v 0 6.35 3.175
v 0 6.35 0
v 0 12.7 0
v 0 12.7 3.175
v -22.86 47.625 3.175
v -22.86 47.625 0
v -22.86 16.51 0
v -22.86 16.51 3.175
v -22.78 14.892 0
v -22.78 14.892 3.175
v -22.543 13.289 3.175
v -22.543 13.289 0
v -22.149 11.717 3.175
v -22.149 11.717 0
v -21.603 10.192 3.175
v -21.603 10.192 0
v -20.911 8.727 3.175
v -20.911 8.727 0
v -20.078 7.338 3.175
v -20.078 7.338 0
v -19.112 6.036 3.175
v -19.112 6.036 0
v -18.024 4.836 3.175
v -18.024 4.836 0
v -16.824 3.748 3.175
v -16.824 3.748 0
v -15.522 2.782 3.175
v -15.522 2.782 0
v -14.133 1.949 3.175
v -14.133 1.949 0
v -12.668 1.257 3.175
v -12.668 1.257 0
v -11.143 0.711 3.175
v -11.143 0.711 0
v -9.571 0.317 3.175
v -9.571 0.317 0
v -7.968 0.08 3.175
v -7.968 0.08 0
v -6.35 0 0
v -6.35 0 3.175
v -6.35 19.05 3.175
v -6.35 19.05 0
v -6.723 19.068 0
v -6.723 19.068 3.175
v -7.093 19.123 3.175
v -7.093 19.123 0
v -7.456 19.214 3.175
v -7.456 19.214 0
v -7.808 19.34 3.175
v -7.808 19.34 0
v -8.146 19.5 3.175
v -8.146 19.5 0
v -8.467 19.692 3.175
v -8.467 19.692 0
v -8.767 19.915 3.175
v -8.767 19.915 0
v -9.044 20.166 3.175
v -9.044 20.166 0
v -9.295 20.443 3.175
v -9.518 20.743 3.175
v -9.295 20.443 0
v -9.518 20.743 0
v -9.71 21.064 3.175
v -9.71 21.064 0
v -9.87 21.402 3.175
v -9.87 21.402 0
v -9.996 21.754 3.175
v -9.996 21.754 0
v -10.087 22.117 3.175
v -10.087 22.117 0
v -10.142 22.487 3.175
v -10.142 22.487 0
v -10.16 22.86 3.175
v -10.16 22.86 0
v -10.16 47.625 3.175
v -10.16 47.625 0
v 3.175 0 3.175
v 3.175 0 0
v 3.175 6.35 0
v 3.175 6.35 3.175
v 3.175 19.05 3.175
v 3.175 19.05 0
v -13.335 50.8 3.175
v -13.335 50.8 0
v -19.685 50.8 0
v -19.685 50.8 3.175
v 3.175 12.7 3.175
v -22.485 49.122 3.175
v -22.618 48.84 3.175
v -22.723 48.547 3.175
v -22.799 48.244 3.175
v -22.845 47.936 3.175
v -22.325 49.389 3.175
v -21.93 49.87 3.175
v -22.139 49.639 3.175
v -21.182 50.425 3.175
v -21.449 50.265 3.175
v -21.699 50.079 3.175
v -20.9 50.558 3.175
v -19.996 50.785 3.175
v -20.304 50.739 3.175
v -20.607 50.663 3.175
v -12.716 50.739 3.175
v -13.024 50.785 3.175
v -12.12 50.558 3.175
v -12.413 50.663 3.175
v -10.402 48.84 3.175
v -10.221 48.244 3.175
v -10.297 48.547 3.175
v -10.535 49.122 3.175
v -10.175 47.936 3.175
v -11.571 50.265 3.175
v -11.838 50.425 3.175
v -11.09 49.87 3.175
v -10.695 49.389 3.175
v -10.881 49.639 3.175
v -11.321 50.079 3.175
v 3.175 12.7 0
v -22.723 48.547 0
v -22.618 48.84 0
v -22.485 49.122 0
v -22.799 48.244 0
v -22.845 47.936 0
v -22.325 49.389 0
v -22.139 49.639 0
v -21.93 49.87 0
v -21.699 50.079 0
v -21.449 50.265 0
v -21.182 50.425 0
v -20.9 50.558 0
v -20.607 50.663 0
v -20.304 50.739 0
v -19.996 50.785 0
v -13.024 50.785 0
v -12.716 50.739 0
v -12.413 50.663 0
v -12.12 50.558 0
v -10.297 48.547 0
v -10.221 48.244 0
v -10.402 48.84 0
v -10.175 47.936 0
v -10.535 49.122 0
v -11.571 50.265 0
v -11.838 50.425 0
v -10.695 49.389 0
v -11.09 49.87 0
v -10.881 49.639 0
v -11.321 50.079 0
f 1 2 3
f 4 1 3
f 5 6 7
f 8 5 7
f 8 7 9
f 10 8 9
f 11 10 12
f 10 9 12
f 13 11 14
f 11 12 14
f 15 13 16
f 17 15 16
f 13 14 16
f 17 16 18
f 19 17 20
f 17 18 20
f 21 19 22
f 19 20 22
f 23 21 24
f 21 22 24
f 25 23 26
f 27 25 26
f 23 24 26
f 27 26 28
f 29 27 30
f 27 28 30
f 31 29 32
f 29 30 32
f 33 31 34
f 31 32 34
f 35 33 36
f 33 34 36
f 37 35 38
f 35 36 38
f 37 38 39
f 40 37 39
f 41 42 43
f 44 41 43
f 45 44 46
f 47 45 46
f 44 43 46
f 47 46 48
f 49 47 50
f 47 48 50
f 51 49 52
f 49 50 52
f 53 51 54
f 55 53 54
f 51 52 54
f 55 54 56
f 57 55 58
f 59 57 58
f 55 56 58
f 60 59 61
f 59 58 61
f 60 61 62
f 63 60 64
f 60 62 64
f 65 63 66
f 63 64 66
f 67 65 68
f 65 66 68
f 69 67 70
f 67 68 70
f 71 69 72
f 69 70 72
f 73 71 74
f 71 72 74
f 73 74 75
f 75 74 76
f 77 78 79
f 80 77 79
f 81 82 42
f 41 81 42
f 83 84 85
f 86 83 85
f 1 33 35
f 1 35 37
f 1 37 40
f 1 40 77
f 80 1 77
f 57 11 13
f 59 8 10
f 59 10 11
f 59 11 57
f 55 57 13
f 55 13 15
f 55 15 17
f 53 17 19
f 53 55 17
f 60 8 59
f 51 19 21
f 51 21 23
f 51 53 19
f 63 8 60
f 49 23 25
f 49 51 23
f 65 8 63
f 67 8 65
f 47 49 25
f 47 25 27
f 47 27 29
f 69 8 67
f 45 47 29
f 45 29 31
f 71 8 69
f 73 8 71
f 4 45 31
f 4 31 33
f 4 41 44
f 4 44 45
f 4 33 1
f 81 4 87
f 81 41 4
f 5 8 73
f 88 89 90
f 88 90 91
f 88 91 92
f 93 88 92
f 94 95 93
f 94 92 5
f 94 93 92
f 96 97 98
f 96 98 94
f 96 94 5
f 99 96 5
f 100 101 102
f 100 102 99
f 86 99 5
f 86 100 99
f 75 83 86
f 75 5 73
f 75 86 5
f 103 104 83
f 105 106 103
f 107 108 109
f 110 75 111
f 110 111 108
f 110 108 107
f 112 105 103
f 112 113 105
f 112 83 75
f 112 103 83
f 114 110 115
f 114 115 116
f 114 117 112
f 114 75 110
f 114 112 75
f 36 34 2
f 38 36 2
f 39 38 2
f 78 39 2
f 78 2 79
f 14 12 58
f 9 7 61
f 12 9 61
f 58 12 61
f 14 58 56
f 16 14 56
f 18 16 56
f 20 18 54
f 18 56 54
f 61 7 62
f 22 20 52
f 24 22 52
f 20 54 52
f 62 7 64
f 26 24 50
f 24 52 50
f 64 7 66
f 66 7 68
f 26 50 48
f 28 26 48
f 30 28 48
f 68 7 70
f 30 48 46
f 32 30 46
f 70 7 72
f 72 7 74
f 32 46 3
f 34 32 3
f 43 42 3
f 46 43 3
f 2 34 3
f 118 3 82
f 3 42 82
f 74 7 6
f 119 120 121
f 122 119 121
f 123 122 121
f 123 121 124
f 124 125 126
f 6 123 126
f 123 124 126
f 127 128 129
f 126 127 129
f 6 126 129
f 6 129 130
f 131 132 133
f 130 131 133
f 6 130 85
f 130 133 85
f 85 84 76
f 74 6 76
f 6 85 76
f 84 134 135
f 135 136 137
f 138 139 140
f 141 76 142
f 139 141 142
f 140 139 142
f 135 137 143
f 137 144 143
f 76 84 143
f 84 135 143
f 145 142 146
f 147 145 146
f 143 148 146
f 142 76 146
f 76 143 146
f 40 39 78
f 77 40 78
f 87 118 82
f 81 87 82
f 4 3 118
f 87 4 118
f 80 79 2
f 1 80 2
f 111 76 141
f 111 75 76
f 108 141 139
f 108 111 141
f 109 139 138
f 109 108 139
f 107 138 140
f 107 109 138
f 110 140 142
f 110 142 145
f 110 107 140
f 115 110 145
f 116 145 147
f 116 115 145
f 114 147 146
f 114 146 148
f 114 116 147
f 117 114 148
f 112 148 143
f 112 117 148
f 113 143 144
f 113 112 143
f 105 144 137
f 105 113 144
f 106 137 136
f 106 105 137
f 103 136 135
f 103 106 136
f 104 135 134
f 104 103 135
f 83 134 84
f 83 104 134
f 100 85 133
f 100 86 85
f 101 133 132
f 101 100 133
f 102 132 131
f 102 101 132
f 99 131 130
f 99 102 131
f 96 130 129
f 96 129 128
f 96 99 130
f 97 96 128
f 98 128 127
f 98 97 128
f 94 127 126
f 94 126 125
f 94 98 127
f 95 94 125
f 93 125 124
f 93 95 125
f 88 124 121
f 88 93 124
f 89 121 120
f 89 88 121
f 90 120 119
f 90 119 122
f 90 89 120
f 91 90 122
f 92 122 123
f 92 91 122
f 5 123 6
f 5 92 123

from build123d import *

# Parameters (mm, degrees)
BOSS_EXTRUDE1_DEPTH = 3.175
FILLET1_R           = 3.175


with BuildPart() as part:
    # Sketch1 → Boss-Extrude1 (new body)
    with BuildSketch(Plane.XY):
        with BuildLine():
            Line((0, 0), (3.175, 0))
            Line((3.175, 0), (3.175, 6.35))
            Line((3.175, 6.35), (0, 6.35))
            Line((0, 6.35), (0, 12.7))
            Line((0, 12.7), (3.175, 12.7))
            Line((3.175, 12.7), (3.175, 19.05))
            Line((3.175, 19.05), (0, 19.05))
            Line((0, 19.05), (-6.35, 19.05))
            ThreePointArc((-6.35, 19.05), (-9.044076836, 20.165923164), (-10.16, 22.86))
            Line((-10.16, 22.86), (-10.16, 50.8))
            Line((-10.16, 50.8), (-22.86, 50.8))
            Line((-22.86, 50.8), (-22.86, 16.51))
            ThreePointArc((-22.86, 16.51), (-18.024332957, 4.835667043), (-6.35, 0))
            Line((-6.35, 0), (0, 0))
        make_face()
    extrude(amount=BOSS_EXTRUDE1_DEPTH)

    # Fillet1
    fillet1_edges = [part.edges().sort_by_distance(p)[0] for p in [
        (-22.86, 50.8, 1.5875),
        (-10.16, 50.8, 1.5875),
    ]]
    fillet(fillet1_edges, radius=FILLET1_R)


solid = part.part
